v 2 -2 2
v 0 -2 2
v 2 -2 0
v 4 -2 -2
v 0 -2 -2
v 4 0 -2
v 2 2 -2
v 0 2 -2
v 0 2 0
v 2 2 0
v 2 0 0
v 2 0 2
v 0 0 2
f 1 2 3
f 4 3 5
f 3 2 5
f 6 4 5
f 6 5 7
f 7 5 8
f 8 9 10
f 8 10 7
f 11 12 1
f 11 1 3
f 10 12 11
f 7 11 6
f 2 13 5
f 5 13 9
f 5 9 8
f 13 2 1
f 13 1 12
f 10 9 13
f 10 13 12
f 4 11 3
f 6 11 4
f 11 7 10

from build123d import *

# Parameters (mm, degrees)
SKETCH2_W           = 4
SKETCH2_H           = 4
BOSS_EXTRUDE1_DEPTH = 4
CUT_EXTRUDE1_DEPTH  = 4
CUT_EXTRUDE2_DEPTH  = 4
CHAMFER1_SIZE       = 2
CUT_EXTRUDE4_DEPTH  = 4


with BuildPart() as part:
    # Sketch2 → Boss-Extrude1 (new body)
    with BuildSketch(Plane(origin=(0, 0, 0), x_dir=(0, 0, -1), z_dir=(1, 0, 0))):
        Rectangle(SKETCH2_W, SKETCH2_H)
    extrude(amount=BOSS_EXTRUDE1_DEPTH)

    # Sketch3 → Cut-Extrude1 (cut)
    with BuildSketch(Plane.XY.offset(2)):
        Polygon((2, 2), (4, 0), (4, 2), align=None)
    extrude(amount=-CUT_EXTRUDE1_DEPTH, mode=Mode.SUBTRACT)

    # Sketch4 → Cut-Extrude2 (cut)
    with BuildSketch(Plane(origin=(0, 2, 0), x_dir=(1, 0, 0), z_dir=(0, 1, 0))):
        Polygon((2, 0), (4, 2), (4, -2), (2, -2), align=None)
    extrude(amount=-CUT_EXTRUDE2_DEPTH, mode=Mode.SUBTRACT)

    # Chamfer1
    chamfer1_edges = [part.edges().sort_by_distance(p)[0] for p in [
        (1, 2, 2),
    ]]
    chamfer(chamfer1_edges, length=CHAMFER1_SIZE)

    # 3DSketch1 → Cut-Extrude4 (cut, along a direction that is not the sketch's normal)
    with BuildSketch(Plane(origin=(2, 0, 0), x_dir=(0.7071067811865476, 0, -0.7071067811865476), z_dir=(0.5773502691896258, 0.5773502691896258, 0.5773502691896258))):
        Polygon((0, 0), (2.828427125, 0), (1.414213562, 2.449489743), align=None)
    extrude(amount=CUT_EXTRUDE4_DEPTH, dir=(0, 1, 0), mode=Mode.SUBTRACT)


solid = part.part
